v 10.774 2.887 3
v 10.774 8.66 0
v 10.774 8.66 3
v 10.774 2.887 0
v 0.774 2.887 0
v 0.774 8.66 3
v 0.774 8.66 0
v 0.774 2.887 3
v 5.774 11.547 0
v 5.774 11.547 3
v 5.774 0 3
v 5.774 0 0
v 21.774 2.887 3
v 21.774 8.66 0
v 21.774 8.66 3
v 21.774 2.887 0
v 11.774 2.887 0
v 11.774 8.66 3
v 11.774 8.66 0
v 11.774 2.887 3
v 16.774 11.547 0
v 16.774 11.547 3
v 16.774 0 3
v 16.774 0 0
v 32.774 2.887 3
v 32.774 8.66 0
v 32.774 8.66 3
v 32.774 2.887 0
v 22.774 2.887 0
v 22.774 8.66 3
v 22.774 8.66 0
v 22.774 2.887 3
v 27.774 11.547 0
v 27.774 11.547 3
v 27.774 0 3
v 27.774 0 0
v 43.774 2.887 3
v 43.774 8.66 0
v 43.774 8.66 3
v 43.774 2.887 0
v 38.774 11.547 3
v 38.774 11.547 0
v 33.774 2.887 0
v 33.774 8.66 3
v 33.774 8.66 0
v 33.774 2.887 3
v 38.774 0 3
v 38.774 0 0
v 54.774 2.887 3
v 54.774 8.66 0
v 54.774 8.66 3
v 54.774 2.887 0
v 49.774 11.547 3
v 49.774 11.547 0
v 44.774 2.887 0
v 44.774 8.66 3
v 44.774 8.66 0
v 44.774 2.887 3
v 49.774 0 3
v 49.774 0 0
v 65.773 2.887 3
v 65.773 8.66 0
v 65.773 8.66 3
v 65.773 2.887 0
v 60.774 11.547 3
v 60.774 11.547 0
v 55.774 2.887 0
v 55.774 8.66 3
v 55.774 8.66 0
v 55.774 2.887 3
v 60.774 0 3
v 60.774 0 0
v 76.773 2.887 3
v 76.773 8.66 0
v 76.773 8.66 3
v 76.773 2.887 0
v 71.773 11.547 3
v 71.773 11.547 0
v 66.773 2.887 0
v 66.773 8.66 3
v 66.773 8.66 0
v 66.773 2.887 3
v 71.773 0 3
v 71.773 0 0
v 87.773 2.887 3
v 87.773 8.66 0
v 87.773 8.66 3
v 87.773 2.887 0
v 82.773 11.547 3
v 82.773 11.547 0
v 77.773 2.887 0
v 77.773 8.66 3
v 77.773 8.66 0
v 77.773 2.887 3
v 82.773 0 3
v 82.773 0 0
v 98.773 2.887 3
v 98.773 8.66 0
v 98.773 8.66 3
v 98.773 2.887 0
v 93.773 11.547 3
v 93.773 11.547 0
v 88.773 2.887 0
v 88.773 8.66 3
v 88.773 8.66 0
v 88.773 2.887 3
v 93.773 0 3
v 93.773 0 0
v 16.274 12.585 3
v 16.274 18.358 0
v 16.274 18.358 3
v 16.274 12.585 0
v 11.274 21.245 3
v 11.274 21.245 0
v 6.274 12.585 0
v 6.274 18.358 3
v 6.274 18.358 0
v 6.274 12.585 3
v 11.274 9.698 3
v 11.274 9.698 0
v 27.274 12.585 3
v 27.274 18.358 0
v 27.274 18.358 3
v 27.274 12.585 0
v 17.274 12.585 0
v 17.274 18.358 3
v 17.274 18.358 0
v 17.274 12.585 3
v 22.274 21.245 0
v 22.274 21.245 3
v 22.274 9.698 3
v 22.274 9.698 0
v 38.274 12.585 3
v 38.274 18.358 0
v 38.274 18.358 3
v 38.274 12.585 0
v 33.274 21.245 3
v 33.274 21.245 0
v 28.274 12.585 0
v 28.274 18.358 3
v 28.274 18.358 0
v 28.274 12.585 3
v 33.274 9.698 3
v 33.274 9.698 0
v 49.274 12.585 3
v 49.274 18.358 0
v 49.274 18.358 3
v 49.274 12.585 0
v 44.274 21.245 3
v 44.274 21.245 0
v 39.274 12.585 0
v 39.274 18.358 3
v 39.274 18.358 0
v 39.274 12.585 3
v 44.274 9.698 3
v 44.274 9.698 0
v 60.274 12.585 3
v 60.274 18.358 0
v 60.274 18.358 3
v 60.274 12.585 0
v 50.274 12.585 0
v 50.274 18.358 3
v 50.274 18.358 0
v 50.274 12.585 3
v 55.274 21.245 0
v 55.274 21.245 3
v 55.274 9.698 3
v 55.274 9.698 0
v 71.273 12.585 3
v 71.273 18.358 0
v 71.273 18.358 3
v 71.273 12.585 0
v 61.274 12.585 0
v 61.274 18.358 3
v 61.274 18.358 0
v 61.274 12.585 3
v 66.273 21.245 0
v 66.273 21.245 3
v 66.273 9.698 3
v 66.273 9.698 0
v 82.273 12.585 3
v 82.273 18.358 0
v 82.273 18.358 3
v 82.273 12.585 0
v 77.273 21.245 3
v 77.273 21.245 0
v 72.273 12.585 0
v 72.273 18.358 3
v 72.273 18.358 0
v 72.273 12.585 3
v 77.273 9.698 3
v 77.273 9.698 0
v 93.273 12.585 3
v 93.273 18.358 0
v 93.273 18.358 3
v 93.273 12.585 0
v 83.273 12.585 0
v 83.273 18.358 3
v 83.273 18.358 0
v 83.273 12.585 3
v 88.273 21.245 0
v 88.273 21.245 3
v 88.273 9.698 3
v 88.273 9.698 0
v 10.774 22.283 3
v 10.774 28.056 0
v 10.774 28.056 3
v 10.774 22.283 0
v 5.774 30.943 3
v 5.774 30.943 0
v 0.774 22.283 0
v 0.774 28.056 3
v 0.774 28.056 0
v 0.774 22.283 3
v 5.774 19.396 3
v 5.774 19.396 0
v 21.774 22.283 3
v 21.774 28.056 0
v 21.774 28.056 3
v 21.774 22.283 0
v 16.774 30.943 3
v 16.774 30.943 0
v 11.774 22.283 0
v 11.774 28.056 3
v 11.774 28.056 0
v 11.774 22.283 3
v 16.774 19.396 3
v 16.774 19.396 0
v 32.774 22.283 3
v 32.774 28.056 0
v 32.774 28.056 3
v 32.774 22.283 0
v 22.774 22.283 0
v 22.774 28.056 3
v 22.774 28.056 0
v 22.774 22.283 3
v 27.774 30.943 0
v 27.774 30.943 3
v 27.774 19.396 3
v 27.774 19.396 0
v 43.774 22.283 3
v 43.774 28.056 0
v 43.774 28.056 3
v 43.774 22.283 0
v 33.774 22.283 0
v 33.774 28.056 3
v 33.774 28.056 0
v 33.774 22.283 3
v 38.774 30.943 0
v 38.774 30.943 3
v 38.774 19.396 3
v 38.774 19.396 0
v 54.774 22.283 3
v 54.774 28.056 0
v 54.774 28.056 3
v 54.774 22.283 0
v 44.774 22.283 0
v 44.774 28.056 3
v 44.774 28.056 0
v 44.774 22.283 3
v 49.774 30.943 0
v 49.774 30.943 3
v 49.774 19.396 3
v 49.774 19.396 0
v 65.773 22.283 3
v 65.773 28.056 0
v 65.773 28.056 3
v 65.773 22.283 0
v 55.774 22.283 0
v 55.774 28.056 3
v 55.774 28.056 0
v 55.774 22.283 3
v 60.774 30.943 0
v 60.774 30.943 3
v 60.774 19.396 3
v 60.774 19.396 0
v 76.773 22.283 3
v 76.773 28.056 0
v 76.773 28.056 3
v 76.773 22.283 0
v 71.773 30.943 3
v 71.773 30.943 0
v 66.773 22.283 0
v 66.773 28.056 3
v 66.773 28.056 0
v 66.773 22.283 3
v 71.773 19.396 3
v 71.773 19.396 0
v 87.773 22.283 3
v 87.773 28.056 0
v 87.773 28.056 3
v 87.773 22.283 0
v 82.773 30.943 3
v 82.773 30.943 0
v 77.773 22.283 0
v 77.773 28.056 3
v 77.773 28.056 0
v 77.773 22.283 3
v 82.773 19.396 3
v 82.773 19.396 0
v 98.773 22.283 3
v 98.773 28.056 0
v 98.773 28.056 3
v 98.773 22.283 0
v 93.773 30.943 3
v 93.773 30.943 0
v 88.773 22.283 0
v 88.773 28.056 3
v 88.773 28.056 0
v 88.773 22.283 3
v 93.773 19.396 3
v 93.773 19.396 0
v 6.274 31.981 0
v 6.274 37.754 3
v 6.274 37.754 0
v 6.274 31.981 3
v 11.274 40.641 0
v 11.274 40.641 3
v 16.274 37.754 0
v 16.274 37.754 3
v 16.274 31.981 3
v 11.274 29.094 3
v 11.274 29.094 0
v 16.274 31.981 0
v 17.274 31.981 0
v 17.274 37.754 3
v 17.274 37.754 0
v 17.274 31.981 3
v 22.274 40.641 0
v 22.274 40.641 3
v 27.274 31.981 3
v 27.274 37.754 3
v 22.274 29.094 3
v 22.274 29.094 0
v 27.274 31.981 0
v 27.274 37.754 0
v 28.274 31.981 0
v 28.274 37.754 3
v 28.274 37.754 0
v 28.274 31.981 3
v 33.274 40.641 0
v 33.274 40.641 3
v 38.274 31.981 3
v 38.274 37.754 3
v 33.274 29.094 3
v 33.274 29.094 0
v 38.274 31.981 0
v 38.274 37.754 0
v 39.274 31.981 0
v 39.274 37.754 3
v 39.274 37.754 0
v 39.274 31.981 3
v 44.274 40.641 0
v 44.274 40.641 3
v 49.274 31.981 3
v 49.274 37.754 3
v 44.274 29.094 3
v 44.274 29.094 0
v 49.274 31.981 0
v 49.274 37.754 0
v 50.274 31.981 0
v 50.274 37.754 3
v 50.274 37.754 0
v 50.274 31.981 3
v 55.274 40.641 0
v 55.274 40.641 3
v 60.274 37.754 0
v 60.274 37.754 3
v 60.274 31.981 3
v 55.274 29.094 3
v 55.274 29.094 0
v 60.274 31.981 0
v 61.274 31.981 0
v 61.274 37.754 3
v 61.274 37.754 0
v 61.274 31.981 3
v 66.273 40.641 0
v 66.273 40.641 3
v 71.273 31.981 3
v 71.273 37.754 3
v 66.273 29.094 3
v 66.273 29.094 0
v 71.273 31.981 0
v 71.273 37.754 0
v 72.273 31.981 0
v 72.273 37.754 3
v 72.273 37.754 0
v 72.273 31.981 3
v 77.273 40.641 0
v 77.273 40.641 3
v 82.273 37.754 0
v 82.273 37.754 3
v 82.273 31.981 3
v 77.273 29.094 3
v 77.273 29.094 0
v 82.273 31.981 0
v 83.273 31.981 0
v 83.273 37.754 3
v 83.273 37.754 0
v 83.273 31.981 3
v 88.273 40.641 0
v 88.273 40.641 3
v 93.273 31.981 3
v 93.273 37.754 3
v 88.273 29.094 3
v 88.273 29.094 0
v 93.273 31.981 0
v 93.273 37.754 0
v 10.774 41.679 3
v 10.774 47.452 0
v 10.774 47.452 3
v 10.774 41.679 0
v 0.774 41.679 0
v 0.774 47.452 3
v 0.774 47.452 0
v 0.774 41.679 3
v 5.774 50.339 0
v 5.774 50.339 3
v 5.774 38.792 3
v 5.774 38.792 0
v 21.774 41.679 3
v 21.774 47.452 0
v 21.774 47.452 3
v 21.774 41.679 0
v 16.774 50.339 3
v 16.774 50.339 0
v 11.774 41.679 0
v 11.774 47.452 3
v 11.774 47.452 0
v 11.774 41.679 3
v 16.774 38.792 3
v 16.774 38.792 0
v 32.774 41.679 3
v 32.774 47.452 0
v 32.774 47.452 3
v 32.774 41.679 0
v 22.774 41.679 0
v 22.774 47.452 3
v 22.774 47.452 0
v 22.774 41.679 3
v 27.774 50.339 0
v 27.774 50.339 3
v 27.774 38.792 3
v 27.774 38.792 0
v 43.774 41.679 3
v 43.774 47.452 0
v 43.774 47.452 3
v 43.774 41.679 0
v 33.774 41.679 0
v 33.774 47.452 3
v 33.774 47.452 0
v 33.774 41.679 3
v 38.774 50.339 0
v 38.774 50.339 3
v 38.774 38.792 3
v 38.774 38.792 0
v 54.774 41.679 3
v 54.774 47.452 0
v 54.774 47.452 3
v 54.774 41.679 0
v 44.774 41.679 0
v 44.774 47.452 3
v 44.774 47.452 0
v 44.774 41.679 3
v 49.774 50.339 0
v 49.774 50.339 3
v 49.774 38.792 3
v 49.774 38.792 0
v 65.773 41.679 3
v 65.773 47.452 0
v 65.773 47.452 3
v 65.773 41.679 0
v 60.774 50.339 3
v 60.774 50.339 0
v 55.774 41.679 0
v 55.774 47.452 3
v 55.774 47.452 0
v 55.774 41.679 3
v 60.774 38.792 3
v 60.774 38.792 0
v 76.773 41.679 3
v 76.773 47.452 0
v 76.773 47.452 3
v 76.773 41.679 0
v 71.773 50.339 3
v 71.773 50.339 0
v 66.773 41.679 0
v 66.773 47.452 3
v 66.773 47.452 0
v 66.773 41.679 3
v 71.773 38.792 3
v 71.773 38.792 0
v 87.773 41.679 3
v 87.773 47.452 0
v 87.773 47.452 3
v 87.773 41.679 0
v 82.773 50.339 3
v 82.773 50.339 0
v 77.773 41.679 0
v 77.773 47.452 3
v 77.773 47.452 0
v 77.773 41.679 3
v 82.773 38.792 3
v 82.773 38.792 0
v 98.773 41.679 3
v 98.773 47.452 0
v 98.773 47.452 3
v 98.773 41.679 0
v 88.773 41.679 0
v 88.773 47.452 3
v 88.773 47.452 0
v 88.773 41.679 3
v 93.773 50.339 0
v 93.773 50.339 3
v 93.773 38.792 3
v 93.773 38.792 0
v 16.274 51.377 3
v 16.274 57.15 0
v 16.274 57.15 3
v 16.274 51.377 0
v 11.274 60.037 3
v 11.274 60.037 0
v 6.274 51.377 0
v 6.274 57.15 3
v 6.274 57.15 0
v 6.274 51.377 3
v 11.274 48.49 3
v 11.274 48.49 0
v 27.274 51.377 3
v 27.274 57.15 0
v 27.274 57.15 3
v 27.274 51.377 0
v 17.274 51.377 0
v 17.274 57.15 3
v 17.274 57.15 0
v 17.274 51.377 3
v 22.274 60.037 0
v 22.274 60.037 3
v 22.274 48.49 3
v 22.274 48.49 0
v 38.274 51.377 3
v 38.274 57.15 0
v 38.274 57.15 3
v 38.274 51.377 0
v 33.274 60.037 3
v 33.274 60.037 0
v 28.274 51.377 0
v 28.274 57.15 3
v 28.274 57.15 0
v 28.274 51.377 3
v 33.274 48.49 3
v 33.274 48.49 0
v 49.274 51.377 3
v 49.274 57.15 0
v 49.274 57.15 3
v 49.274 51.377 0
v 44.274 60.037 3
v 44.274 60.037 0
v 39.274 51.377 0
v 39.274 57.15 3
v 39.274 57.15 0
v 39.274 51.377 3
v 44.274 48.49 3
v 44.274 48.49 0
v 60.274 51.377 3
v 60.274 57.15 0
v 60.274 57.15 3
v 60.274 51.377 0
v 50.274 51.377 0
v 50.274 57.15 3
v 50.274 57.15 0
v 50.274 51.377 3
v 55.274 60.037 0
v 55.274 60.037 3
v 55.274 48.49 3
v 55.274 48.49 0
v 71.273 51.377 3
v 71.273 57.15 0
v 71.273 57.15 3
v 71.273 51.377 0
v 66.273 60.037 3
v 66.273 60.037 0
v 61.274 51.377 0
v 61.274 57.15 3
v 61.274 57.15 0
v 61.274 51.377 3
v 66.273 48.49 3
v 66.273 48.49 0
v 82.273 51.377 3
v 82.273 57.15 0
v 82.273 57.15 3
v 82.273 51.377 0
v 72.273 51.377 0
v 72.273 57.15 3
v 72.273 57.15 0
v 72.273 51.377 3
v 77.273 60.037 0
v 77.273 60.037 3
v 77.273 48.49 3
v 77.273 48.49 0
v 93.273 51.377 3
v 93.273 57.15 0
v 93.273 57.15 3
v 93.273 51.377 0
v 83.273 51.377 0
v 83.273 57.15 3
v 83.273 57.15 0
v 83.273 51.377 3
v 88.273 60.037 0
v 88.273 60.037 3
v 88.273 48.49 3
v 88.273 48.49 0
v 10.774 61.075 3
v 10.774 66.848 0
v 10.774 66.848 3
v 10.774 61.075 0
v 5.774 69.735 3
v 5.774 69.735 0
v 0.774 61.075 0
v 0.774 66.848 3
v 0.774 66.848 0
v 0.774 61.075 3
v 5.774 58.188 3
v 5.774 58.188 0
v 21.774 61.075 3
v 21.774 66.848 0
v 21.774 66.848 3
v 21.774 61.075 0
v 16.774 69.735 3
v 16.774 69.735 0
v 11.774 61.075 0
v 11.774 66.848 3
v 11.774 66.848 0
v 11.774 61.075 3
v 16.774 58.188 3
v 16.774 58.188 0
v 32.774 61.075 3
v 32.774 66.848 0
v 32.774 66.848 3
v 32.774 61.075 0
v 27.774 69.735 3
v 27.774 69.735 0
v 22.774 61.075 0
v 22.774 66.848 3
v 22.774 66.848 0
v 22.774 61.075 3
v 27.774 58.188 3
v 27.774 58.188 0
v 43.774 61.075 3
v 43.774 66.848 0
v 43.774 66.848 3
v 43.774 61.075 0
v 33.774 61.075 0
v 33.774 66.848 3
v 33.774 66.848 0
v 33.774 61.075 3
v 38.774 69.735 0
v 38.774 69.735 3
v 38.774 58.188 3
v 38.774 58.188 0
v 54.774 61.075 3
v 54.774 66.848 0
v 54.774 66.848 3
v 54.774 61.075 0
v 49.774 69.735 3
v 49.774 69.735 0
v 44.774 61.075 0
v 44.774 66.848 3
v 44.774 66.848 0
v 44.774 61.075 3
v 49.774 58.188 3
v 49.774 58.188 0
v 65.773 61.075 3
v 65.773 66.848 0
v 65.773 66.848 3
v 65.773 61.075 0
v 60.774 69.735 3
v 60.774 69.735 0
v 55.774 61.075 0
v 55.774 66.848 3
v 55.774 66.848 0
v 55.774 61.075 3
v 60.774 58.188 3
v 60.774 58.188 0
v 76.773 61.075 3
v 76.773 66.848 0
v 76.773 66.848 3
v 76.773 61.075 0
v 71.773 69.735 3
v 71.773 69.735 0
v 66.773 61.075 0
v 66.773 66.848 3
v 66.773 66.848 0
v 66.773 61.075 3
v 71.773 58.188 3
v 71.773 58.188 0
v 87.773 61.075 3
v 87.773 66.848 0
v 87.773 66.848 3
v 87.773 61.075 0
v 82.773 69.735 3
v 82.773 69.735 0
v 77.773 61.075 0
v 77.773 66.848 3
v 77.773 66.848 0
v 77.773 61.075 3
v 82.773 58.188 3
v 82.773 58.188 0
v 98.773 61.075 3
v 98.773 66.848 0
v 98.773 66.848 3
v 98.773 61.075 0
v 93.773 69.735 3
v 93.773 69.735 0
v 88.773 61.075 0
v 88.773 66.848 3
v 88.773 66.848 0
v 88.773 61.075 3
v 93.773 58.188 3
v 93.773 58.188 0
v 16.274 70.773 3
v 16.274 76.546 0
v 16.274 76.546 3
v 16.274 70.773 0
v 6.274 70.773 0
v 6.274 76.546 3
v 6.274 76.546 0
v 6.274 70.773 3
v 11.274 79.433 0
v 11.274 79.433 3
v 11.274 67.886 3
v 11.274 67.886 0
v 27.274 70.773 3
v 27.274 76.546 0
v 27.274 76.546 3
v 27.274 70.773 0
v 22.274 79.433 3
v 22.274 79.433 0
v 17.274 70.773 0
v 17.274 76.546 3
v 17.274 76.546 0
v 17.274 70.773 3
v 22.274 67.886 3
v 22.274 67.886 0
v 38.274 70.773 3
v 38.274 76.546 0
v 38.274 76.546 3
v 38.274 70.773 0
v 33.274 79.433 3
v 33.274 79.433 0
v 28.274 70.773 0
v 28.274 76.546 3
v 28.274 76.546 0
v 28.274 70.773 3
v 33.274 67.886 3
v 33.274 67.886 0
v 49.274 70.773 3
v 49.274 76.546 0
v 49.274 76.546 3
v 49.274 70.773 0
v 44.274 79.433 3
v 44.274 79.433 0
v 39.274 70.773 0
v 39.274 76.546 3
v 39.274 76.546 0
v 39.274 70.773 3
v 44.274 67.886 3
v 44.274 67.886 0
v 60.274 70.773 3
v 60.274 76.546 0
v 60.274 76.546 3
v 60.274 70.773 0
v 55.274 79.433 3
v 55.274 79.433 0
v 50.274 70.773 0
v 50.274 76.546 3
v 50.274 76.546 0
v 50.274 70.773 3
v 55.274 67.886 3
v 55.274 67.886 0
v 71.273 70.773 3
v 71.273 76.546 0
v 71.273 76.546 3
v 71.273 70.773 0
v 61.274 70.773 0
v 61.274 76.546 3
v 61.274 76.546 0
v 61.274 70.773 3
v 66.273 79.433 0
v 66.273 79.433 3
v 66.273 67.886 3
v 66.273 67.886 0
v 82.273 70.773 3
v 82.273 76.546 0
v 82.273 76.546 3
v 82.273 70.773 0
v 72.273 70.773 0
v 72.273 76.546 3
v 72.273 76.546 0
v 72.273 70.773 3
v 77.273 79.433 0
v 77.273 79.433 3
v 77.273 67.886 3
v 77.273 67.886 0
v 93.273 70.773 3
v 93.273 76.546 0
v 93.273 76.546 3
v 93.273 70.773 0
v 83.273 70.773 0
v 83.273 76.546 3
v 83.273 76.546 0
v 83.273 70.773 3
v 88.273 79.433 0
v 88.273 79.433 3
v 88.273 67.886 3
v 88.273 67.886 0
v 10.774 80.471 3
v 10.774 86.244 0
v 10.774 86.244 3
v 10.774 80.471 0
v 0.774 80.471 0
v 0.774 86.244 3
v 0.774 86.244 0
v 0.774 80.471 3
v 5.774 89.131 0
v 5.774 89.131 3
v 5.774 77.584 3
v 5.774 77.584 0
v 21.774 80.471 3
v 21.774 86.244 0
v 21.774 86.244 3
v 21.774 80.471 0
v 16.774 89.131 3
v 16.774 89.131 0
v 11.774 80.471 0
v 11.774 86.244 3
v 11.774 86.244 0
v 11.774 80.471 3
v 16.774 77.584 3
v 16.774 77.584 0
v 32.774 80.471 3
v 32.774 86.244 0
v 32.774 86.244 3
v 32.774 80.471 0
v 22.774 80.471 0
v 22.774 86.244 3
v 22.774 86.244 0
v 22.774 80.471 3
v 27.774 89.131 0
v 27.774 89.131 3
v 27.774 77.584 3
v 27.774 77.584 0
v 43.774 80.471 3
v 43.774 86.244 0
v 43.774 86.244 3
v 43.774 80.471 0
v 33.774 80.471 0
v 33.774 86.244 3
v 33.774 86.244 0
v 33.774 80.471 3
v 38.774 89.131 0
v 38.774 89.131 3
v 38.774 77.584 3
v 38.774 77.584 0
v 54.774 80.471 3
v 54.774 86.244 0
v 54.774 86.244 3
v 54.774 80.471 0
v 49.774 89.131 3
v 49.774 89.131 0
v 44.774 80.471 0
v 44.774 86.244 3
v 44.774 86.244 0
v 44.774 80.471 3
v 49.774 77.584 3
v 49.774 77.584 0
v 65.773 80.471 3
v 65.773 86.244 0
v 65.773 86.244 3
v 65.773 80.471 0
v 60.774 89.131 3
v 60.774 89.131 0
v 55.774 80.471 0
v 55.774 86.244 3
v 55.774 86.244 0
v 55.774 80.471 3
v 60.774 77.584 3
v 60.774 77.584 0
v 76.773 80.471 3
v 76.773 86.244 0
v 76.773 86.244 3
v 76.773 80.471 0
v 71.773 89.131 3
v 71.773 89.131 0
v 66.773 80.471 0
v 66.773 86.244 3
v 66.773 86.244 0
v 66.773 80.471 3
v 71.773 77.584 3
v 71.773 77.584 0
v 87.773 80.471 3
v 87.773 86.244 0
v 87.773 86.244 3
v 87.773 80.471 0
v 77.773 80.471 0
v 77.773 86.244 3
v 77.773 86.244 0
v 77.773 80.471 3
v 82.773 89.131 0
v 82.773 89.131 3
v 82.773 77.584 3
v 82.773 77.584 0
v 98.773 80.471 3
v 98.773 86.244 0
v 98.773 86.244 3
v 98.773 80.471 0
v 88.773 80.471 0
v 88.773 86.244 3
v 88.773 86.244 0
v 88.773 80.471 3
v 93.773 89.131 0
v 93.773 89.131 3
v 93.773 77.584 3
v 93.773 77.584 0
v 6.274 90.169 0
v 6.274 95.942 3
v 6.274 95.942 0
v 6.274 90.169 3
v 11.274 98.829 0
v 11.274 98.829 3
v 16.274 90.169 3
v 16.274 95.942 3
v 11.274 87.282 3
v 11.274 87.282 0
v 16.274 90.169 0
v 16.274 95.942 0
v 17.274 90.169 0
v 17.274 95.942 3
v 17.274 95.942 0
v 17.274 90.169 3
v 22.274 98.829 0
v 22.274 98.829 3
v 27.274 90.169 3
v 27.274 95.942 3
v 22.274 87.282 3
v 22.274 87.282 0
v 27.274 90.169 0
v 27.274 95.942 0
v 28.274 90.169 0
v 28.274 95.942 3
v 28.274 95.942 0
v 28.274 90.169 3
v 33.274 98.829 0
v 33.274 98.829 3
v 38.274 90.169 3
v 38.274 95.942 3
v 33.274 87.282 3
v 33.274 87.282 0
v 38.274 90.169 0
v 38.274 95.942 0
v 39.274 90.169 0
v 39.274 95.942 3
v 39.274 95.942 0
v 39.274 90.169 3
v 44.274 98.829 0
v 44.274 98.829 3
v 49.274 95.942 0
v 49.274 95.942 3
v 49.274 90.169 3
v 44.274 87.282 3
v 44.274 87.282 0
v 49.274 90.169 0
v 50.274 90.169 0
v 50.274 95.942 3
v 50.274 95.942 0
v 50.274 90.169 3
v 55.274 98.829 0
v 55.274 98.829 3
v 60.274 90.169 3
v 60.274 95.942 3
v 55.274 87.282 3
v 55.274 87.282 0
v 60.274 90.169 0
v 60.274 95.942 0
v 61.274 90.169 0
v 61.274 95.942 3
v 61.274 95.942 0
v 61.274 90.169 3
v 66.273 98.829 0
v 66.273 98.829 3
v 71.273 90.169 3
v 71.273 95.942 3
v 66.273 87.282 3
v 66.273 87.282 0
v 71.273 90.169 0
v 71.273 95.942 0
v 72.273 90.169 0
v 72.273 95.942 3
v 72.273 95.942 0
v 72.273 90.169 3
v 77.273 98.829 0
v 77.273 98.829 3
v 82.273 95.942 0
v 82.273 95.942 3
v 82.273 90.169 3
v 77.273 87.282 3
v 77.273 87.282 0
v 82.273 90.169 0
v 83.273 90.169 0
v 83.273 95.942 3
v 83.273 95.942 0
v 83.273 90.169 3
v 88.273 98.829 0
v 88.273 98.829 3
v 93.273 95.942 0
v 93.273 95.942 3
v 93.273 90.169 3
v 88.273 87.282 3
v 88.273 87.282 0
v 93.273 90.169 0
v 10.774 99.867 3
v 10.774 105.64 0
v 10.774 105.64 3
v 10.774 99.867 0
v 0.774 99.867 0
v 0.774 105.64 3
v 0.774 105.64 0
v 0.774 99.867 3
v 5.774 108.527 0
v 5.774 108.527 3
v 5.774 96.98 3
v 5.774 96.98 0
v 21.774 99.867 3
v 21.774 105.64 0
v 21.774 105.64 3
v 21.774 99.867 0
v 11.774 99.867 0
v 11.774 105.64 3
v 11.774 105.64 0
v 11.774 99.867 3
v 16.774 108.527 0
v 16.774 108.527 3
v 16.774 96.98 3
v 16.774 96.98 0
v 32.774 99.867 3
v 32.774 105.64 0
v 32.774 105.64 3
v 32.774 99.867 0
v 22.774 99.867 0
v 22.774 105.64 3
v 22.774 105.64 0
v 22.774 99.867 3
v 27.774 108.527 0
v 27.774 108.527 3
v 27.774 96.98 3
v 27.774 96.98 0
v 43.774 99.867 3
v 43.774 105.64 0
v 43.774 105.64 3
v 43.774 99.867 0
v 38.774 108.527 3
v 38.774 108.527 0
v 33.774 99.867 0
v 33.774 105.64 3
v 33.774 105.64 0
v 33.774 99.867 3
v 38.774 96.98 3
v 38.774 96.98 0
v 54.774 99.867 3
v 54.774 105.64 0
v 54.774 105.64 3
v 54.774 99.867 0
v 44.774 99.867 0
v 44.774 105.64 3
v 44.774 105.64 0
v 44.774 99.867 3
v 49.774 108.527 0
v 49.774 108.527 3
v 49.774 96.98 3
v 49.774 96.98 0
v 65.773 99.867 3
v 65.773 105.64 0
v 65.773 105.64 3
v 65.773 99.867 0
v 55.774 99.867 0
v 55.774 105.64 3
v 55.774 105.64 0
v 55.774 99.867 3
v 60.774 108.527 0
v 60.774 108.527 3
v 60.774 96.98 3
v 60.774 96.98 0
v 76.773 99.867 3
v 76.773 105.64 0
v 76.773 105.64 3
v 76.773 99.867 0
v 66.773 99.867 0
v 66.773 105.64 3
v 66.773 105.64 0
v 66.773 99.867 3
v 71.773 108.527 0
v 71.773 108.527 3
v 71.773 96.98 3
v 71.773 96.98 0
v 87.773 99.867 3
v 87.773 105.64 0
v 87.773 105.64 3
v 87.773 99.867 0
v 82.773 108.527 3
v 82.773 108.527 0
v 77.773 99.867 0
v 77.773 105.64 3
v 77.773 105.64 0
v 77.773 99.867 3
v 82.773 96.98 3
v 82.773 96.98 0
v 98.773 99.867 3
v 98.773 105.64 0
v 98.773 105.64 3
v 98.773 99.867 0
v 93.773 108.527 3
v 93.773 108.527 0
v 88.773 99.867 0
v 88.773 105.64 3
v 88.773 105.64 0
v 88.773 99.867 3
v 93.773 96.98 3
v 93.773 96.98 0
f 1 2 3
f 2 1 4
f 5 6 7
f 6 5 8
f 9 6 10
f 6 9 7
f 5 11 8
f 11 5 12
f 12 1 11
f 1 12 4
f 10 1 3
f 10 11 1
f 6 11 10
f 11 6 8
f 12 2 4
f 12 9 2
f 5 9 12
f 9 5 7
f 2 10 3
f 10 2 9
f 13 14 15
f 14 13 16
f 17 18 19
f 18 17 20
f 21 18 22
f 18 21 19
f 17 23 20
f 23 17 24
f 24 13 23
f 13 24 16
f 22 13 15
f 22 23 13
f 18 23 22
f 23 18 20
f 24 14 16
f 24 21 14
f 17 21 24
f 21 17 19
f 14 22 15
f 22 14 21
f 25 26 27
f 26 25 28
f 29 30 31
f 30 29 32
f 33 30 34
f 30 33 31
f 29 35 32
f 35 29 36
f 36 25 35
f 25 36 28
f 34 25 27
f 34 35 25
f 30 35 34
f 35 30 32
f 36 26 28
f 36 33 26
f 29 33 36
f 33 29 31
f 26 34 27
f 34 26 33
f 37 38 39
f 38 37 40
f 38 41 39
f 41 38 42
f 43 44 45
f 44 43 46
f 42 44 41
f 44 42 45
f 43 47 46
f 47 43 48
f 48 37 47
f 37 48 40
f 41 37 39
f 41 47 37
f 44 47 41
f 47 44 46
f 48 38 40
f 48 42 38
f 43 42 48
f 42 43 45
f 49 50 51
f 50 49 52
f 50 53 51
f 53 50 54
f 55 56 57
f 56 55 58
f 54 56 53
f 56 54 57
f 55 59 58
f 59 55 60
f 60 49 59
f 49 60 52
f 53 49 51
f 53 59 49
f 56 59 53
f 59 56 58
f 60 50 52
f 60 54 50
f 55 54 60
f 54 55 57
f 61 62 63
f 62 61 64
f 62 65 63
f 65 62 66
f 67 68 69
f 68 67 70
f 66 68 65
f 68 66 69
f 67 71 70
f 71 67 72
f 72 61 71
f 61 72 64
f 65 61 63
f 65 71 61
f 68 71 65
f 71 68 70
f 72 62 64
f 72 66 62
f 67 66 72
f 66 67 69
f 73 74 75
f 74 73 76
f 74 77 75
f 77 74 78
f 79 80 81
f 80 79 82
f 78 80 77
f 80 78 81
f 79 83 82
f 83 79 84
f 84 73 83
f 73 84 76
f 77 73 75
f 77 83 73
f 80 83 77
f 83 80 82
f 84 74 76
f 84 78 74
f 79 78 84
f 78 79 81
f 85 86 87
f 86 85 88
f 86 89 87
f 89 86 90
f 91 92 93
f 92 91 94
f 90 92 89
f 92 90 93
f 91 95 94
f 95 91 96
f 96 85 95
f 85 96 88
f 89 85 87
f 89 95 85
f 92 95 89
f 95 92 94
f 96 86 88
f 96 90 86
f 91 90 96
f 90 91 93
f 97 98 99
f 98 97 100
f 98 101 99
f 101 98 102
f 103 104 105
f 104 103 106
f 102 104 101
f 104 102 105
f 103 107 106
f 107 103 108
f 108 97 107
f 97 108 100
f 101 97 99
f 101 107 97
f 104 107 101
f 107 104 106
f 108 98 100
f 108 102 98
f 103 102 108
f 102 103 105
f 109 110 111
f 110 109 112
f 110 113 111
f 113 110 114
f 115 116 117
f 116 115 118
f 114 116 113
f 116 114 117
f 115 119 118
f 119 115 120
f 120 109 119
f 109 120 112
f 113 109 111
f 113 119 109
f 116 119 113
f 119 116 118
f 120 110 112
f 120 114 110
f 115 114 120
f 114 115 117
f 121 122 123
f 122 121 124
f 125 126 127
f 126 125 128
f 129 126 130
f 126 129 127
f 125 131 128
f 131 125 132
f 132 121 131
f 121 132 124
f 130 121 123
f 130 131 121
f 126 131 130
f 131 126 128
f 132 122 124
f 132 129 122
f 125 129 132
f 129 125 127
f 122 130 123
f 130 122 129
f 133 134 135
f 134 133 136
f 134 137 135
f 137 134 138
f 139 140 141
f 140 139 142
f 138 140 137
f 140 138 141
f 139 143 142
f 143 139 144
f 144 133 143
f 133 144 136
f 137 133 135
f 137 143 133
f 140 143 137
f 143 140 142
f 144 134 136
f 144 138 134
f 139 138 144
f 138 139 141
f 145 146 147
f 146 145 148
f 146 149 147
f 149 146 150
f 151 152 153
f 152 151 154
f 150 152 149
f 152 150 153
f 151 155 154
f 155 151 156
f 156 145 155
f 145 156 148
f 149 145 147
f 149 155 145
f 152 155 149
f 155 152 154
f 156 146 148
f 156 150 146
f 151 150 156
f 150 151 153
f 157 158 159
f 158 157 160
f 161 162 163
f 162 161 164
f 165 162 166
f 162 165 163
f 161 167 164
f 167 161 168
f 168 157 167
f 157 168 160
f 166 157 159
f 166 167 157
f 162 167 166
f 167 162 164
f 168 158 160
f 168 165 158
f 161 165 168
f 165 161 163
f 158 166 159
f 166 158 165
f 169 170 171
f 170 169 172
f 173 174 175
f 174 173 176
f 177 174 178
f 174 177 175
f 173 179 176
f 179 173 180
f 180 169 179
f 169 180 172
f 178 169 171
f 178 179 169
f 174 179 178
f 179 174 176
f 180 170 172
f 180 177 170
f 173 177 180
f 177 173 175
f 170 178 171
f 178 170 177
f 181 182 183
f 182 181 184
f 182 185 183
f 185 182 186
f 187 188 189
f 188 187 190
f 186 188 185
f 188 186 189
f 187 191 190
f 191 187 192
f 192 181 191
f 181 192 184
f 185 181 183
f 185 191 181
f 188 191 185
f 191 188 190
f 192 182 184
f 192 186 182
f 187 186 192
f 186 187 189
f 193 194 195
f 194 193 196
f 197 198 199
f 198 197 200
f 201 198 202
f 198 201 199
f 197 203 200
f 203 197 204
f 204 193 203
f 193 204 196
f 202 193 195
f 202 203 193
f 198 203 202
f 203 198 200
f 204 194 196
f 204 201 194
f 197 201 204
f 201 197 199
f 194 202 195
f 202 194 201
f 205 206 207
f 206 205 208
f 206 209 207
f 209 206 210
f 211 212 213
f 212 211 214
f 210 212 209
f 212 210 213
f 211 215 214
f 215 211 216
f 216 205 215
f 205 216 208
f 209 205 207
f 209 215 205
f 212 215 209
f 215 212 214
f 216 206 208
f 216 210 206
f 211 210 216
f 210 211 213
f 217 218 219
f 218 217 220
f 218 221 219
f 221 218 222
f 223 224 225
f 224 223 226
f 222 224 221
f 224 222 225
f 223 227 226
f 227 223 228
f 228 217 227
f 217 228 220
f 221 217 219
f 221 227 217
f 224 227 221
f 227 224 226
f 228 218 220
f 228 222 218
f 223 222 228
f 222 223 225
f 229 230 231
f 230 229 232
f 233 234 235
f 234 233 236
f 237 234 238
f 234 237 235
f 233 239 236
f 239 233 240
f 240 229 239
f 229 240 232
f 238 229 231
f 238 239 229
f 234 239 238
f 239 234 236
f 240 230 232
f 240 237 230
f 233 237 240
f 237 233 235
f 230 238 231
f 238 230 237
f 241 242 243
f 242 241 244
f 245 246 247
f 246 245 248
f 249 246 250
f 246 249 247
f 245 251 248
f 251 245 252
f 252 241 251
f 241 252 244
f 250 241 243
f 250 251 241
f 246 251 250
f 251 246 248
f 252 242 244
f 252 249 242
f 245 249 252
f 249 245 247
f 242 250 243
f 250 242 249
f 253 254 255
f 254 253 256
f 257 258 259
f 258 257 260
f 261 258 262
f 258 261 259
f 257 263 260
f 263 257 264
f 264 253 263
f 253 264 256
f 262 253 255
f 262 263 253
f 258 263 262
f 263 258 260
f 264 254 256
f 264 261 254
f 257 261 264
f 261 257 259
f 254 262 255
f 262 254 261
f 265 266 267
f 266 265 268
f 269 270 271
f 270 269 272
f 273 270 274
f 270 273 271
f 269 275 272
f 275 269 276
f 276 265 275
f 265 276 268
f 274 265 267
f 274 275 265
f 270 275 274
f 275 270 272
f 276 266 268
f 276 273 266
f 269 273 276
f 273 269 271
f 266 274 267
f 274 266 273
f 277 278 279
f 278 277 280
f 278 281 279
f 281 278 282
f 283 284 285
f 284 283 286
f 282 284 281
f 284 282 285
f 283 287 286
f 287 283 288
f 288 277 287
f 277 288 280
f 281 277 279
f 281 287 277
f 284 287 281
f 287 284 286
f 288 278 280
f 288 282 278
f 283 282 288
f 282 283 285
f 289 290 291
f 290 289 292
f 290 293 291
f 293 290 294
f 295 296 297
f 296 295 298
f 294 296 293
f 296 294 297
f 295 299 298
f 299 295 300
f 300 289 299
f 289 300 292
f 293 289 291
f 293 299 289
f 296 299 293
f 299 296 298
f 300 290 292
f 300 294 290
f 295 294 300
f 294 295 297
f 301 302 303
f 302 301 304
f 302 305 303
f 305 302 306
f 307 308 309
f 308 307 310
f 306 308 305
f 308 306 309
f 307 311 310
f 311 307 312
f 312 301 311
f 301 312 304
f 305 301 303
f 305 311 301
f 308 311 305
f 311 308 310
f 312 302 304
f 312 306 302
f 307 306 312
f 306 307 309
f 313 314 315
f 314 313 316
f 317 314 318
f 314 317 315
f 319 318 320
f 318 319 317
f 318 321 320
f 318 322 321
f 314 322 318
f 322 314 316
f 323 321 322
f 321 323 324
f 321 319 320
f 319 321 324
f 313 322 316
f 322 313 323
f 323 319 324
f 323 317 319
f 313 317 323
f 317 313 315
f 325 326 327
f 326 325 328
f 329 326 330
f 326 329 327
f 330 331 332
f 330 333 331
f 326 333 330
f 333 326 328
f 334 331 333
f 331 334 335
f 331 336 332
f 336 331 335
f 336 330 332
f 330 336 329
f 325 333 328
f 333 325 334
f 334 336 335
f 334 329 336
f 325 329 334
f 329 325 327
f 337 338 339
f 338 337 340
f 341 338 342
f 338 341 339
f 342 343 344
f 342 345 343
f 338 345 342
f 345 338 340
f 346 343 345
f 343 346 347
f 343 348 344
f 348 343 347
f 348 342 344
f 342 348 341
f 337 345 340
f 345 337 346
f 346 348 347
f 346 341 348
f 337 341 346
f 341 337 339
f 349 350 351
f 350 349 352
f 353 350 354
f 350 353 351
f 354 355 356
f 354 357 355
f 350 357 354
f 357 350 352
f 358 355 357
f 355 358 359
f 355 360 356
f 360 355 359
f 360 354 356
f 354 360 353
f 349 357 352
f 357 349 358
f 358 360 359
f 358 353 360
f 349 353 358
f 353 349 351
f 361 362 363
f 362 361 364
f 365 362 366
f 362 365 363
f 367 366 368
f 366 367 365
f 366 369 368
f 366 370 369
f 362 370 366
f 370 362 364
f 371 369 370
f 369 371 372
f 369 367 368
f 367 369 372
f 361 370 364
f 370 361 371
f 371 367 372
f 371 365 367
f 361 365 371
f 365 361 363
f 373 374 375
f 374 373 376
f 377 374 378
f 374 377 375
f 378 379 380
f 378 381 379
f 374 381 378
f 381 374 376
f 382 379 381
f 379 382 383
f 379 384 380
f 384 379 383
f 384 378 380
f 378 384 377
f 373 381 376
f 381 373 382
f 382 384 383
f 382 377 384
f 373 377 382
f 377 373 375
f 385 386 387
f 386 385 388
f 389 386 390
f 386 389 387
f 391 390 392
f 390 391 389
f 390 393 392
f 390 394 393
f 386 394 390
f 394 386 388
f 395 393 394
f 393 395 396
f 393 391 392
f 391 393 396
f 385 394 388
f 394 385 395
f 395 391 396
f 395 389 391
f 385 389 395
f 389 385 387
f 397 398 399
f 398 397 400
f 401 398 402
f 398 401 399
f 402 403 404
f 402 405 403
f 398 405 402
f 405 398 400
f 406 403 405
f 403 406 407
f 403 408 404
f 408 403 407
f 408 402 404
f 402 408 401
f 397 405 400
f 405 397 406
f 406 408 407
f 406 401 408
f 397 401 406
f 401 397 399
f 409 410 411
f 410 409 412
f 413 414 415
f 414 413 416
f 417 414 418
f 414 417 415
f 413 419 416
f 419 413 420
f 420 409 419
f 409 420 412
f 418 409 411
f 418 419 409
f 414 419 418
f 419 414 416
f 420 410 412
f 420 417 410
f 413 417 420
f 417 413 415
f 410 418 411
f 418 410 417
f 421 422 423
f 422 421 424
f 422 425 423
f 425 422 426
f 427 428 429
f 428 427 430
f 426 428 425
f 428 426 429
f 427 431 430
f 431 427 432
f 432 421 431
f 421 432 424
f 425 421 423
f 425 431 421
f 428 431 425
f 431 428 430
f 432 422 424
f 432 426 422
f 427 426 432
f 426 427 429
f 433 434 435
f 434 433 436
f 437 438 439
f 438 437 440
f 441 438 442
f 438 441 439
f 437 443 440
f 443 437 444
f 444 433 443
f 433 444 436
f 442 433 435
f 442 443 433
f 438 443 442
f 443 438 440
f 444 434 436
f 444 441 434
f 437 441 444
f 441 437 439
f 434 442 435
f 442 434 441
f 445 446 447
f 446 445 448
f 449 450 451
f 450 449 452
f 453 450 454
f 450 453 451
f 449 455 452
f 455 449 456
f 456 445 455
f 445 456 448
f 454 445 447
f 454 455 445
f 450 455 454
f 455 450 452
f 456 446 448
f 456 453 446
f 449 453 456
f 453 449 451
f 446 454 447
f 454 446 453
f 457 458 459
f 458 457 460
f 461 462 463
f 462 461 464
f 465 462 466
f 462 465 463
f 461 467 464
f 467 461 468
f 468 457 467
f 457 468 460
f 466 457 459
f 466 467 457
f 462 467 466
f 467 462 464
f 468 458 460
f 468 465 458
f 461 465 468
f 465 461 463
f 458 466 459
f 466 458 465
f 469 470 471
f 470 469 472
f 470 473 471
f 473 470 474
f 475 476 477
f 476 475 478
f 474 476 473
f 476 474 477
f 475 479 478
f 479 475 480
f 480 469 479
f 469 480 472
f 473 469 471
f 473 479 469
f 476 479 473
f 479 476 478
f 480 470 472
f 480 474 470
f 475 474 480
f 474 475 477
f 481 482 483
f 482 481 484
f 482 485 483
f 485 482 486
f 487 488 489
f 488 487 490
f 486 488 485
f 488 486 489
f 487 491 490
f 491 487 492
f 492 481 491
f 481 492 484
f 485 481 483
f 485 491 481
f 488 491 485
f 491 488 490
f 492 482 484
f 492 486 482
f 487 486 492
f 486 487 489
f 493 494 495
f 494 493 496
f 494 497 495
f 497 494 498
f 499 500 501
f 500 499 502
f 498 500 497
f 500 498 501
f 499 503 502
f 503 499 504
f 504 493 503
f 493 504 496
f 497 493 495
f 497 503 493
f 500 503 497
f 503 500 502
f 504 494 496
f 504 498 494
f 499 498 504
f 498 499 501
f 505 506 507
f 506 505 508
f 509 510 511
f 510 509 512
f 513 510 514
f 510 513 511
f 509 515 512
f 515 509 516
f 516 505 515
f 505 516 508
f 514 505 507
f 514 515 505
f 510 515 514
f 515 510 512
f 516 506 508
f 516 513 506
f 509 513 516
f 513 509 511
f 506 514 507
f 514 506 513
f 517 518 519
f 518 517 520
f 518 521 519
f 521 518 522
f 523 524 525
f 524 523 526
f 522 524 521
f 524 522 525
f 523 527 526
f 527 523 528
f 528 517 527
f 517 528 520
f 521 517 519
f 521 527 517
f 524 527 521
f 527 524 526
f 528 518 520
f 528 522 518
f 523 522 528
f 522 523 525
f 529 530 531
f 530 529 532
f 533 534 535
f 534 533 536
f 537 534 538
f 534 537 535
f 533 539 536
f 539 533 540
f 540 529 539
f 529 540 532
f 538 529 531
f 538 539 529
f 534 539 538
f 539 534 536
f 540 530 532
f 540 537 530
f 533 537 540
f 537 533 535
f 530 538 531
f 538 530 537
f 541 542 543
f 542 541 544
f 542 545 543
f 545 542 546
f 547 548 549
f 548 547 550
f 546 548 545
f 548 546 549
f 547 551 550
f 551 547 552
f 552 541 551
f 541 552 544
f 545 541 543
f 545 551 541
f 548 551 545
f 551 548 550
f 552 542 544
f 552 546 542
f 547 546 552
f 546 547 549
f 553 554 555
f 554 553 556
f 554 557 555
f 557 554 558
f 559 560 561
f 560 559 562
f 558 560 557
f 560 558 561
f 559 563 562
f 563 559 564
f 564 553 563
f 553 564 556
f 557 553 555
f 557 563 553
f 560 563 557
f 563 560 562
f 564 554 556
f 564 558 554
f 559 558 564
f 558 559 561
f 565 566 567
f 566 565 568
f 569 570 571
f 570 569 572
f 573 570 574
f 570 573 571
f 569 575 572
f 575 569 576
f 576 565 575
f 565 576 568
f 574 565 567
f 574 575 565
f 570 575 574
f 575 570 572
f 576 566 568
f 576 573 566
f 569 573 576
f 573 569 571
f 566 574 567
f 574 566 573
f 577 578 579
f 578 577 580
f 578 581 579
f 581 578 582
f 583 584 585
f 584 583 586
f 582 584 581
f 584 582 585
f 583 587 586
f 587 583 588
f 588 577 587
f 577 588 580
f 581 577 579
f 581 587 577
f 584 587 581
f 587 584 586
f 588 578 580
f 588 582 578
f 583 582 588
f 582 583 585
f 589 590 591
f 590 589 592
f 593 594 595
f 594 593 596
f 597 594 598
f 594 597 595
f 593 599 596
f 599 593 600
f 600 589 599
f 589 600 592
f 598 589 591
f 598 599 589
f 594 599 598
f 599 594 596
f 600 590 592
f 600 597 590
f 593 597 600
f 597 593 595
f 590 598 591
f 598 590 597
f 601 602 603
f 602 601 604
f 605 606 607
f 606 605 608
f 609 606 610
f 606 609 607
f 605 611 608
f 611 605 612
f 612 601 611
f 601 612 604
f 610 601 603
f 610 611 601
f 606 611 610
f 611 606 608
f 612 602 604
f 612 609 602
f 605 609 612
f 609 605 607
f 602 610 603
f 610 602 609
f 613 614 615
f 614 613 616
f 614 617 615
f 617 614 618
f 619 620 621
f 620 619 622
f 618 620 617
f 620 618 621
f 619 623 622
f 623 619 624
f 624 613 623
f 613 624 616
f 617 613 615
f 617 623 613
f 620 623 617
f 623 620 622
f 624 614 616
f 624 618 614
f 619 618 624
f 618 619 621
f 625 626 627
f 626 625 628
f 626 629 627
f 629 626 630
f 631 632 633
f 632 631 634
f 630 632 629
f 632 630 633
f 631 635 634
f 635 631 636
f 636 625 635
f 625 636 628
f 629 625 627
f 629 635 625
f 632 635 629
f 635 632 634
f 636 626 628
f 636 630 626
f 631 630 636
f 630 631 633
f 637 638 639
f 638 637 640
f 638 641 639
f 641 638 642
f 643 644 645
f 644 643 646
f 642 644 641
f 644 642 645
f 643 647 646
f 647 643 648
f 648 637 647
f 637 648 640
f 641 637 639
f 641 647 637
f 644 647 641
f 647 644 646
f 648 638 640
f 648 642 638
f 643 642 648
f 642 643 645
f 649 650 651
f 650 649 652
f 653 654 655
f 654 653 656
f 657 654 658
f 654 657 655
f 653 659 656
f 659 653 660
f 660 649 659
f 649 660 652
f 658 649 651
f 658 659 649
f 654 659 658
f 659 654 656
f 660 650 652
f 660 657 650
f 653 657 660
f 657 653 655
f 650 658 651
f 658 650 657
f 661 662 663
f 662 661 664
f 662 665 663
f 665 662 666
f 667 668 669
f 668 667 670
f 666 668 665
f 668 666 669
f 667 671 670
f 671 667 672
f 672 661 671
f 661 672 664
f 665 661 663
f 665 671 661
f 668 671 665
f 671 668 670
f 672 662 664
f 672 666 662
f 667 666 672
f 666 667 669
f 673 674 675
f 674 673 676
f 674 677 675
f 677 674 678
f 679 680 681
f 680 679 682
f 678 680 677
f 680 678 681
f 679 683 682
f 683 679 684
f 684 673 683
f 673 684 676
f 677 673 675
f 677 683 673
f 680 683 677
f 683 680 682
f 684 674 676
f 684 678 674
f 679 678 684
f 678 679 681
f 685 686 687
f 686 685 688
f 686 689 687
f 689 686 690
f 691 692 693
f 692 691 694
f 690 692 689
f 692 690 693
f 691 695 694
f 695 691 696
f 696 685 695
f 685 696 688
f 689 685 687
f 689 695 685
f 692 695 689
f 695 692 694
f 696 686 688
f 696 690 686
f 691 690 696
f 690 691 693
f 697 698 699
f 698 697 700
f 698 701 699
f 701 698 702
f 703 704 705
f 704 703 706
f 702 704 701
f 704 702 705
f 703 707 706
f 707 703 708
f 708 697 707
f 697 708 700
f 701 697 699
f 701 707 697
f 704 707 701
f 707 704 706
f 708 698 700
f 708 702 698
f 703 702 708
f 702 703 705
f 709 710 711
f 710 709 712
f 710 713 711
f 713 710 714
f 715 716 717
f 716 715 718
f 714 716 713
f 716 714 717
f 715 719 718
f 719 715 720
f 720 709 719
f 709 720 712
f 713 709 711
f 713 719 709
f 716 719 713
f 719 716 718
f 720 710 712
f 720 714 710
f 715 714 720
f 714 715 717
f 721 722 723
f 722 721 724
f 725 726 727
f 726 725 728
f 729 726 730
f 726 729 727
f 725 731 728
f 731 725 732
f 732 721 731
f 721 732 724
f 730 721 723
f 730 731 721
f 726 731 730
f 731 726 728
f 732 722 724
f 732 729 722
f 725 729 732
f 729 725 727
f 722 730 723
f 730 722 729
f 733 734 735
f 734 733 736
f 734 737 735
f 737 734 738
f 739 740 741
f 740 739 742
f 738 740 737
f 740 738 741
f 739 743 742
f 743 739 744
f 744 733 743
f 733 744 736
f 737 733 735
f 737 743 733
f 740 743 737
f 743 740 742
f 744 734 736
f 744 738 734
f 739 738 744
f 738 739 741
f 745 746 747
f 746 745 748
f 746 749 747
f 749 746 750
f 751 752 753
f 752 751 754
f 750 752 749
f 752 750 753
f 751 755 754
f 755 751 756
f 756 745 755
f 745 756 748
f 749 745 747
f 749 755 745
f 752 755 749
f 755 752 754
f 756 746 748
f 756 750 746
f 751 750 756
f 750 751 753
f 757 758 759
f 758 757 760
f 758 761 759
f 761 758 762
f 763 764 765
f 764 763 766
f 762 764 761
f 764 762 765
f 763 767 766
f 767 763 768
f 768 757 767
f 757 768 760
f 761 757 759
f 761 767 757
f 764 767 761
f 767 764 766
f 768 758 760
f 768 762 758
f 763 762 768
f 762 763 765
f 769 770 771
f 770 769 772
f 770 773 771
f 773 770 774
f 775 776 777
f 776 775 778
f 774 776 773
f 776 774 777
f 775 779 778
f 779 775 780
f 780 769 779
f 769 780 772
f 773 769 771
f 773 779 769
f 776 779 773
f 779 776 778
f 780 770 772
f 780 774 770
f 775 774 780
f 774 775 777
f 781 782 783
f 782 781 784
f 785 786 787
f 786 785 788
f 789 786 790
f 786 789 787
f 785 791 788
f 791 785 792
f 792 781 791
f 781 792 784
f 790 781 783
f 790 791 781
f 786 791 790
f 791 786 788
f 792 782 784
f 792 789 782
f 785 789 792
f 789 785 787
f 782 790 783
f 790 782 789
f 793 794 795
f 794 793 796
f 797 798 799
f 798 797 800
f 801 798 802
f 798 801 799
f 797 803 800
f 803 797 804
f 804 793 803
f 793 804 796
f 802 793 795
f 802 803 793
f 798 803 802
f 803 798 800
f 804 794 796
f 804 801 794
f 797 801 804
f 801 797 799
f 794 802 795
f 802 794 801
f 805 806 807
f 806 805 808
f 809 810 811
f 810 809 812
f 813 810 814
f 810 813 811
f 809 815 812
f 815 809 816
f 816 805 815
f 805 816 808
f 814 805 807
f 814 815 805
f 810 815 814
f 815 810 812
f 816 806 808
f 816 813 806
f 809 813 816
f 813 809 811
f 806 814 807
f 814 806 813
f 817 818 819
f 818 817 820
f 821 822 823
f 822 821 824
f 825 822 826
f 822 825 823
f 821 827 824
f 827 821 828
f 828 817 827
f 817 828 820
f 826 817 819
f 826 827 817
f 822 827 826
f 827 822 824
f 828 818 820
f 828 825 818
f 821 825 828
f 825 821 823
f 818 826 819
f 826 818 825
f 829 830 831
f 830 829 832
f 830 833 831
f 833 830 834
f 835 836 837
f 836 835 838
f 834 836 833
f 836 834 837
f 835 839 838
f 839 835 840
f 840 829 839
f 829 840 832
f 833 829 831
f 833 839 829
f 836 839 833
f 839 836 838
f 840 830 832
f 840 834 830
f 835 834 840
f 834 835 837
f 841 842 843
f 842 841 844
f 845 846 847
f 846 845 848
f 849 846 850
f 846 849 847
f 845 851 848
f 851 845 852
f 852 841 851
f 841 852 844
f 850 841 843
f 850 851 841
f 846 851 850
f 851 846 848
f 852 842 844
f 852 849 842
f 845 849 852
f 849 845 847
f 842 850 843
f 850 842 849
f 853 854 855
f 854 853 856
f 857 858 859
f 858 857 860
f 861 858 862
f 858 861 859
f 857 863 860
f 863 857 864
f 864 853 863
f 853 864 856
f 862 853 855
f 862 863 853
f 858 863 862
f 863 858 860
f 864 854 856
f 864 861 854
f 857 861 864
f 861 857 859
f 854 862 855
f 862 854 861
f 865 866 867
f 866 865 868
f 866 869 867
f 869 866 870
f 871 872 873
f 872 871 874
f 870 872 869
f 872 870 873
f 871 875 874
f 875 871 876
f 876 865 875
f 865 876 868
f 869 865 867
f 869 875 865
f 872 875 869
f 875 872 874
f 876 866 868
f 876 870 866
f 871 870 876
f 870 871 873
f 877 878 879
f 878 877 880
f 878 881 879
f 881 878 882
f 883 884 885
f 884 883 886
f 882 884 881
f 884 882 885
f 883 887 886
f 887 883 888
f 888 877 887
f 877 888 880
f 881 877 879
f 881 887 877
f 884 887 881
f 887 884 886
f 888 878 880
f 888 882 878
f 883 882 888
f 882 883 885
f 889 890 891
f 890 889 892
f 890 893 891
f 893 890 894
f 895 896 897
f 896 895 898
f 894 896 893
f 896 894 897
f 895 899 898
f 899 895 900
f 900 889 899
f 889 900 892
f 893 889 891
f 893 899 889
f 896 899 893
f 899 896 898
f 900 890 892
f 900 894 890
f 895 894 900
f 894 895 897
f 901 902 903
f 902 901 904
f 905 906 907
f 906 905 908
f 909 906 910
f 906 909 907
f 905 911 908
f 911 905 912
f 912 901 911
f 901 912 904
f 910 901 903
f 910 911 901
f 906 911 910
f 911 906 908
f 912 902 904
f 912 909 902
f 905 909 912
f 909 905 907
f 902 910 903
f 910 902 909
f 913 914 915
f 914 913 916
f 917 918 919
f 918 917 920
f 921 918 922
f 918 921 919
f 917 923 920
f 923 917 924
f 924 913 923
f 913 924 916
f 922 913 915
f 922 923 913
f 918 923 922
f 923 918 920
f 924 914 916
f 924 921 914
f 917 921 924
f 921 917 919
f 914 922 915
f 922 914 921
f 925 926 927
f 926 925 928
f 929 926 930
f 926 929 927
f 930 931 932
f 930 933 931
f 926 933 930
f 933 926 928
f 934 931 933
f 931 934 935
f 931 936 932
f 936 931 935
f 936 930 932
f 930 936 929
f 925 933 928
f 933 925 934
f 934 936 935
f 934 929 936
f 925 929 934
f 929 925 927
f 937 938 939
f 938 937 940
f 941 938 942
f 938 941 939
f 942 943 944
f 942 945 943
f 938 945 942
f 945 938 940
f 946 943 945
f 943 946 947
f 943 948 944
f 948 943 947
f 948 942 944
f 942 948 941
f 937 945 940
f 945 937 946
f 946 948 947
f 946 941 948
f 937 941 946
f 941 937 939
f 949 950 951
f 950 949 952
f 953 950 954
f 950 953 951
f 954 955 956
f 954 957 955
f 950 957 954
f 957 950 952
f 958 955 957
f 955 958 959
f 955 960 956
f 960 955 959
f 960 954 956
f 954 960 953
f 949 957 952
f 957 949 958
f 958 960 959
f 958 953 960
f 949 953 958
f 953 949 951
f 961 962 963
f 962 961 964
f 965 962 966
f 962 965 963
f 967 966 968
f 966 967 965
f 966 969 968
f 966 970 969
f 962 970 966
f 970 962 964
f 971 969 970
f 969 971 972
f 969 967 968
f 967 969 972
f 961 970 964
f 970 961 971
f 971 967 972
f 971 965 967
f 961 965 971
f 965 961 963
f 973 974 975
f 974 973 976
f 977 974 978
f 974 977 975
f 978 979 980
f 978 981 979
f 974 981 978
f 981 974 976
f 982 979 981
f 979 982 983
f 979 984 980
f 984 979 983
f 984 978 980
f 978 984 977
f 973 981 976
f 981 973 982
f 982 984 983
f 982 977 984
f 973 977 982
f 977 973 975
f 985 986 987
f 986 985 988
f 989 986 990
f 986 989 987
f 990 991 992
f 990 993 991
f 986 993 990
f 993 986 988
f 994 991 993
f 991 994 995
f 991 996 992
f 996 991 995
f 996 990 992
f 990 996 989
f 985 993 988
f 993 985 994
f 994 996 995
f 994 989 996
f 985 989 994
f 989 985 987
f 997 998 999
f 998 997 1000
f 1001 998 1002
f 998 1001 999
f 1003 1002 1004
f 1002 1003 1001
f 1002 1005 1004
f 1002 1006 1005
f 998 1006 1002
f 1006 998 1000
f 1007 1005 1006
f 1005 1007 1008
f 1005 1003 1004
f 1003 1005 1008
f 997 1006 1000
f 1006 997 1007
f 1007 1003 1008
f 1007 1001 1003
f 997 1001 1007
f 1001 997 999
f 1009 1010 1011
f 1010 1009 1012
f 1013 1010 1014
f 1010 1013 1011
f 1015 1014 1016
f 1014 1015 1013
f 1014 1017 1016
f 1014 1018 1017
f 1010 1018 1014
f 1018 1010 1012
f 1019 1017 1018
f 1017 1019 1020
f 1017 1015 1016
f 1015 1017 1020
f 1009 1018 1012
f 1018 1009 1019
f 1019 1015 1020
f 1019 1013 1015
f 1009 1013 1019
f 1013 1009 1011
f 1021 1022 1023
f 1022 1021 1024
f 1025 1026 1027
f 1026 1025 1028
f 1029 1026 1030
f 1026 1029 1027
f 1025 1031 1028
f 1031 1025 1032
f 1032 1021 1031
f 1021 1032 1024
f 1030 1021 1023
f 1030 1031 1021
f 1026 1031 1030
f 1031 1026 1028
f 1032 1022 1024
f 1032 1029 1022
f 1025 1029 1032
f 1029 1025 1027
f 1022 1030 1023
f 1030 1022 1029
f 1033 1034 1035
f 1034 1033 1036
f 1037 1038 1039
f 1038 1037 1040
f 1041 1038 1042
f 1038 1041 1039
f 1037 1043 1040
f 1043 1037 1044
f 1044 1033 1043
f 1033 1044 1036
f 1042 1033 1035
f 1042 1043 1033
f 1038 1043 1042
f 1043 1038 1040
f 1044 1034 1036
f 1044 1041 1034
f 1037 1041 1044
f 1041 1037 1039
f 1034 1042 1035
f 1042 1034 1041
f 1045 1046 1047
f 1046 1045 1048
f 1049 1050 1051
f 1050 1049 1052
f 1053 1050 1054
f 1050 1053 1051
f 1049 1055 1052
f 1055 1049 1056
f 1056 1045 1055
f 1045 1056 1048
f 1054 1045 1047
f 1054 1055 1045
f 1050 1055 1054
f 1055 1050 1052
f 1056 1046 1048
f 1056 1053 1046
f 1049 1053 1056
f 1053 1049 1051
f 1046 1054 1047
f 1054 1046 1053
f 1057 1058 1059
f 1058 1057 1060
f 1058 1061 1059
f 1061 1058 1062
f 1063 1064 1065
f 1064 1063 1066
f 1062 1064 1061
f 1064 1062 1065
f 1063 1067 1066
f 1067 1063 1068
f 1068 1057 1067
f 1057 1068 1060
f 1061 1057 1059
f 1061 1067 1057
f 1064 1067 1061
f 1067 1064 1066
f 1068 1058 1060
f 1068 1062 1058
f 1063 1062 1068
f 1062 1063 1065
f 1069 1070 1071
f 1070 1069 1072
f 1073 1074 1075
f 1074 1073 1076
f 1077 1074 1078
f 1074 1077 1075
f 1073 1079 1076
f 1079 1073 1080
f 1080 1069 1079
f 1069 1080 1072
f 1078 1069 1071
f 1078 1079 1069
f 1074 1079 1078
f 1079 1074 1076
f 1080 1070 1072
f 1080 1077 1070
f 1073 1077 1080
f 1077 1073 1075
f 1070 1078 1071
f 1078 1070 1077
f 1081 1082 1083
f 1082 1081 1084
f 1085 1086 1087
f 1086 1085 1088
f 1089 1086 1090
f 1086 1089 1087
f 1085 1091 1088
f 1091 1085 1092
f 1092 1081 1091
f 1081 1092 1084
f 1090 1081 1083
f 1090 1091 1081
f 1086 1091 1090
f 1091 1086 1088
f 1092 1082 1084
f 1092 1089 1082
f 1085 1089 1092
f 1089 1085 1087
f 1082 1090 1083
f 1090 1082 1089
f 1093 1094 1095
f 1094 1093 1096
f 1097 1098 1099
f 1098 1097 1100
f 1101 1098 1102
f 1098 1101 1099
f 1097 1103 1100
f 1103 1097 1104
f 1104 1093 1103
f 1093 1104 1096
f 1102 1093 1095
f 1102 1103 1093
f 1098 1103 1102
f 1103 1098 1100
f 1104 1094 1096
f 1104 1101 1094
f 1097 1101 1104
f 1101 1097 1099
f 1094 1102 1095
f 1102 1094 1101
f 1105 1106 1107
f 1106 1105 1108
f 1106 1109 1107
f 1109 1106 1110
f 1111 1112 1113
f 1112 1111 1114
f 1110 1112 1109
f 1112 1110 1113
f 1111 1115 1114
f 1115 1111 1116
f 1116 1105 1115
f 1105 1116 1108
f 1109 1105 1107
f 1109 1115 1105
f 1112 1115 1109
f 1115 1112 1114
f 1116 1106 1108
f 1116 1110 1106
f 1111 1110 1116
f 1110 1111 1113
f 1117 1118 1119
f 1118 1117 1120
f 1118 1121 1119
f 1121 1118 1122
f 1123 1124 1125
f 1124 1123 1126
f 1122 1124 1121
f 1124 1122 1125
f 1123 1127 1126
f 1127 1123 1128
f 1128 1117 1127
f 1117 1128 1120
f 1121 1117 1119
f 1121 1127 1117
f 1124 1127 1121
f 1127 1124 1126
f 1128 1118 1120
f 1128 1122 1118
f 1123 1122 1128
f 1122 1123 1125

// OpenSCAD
// created by IndiePandaaaaa | Lukas

function hexagon_get_inner_diameter(single_outer_diameter = 20) = tan(60) * (single_outer_diameter / 2);

function hexagon_inbetween_distance_x(single_outer_diameter = 20) = single_outer_diameter -
  hexagon_get_inner_diameter(single_outer_diameter);

function hexagon_get_y_inner_element_additional_height(single_outer_diameter = 20) = single_outer_diameter / 2 +
    hexagon_inbetween_distance_x(single_outer_diameter) * cos(30) + (single_outer_diameter / 2) * cos(60);

function hexagon_get_y_outer_element_height(single_outer_diameter = 20) = single_outer_diameter;

function hexagon_get_y_next_structure(single_outer_diameter = 20) = (single_outer_diameter / 2 * 3) +
    hexagon_inbetween_distance_x(single_outer_diameter) * cos(30) * 2;

function hexagon_get_y_element_height(single_outer_diameter = 20) =
  hexagon_get_y_outer_element_height(single_outer_diameter) +
  hexagon_get_y_inner_element_additional_height(single_outer_diameter);

function hexagon_get_x_element_count(width, single_outer_diameter = 20) = floor(width / single_outer_diameter);

function hexagon_get_y_element_count(depth, single_outer_diameter = 20) = floor(((depth -
  (hexagon_get_y_element_height(single_outer_diameter) - hexagon_get_y_next_structure(single_outer_diameter))) /
  hexagon_get_y_next_structure(single_outer_diameter)) * 2);

function hexagon_get_used_width(width, single_outer_diameter = 20) = single_outer_diameter *
  hexagon_get_x_element_count(width, single_outer_diameter) - hexagon_inbetween_distance_x(single_outer_diameter);

function hexagon_get_used_depth(depth, single_outer_diameter = 20) = round(hexagon_get_y_element_count(depth,
single_outer_diameter) / 2) * hexagon_get_y_outer_element_height(single_outer_diameter) +
    floor(hexagon_get_y_element_count(depth, single_outer_diameter) / 2) * (hexagon_get_y_next_structure(
  single_outer_diameter) - single_outer_diameter) +
      (hexagon_get_y_element_count(depth, single_outer_diameter) + 1) % 2 * (hexagon_get_y_element_height(
  single_outer_diameter) - hexagon_get_y_next_structure(single_outer_diameter));

module hexagon_pattern(width, depth, thickness, single_outer_diameter = 20, vertices = 6) {
  inner_diameter = hexagon_get_inner_diameter(single_outer_diameter);

  count_x = hexagon_get_x_element_count(width, single_outer_diameter);
  count_y = hexagon_get_y_element_count(depth, single_outer_diameter);

  angle = 360 / vertices * 1.5;

  for (y = [0:count_y - 1]) {
    for (x = [0:count_x - 1]) {

      if (y % 2 == 0) {
        translate([inner_diameter / 2 + single_outer_diameter * x, (single_outer_diameter / 2) + inner_diameter
          * y, -0.01]) {
          linear_extrude(height = thickness + 0.02) {
            rotate([0, 0, angle]) circle(d = single_outer_diameter, $fn = vertices);
          }
        }
      } else if (x < count_x - 1) {
        translate([inner_diameter / 2 + single_outer_diameter * x + single_outer_diameter / 2,
            (single_outer_diameter / 2) + inner_diameter * y, -0.01]) {
          linear_extrude(height = thickness + 0.02) {
            rotate([0, 0, angle]) circle(d = single_outer_diameter, $fn = vertices);
          }
        }
      }

    }
  }
}


module __hex_pattern(width, depth, thickness, hex_inner_diameter = 10, border_thickness = 1) {
  function __hex_outer_diameter(inner_diameter) = ((inner_diameter / 2) / tan(60)) * 4;
  function __hex_count_width(width, inner_diameter, border_thickness) = floor((width - border_thickness) / (inner_diameter + border_thickness));
  function __hex_count_depth(depth, inner_diameter, border_thickness) = floor((depth - border_thickness) / (inner_diameter * .75 + border_thickness));

  hex_outer_diameter = __hex_outer_diameter(hex_inner_diameter);
  count_x = __hex_count_width(width, hex_inner_diameter, border_thickness);
  count_y = __hex_count_depth(depth, hex_inner_diameter, border_thickness);

// TODO: 2D approach?
  for (y = [0:count_y - 1]) {
    for (x = [0:count_x - 1]) {
      translate([
          //(hex_id - grid_thickness * hex_id/4) * x, 
          //(hex_od - grid_thickness * hex_od/4) * y + ((hex_id/2 - grid_thickness/2)* (x%2)),
      (hex_inner_diameter + border_thickness) * x + (hex_inner_diameter / 2 + border_thickness / 2) * (y%2),
      (hex_outer_diameter/3*2 + border_thickness*2) * y,
      0
      ]) {
          if (y%2 == 1 && count_x-1 == x) {}
          else
            translate(v = [hex_outer_diameter/2, hex_outer_diameter/2, 0])
              rotate(a = 90, v = [0,0,1]) 
                cylinder(h = thickness, d=hex_outer_diameter, center = false, $fn = 6);
      }
    }
  }
}

width = 100;
depth = 100;
difference() {
  //cube([width, depth, 3]);
  //translate([(width - hexagon_get_used_width(width)) / 2, (depth - hexagon_get_used_depth(depth)) / 2, 0])
    __hex_pattern(width, depth, 3);
}

module hex_structure(inner_diameter, thickness, horizontal_count, vertical_count, height, screw_mounting_thickness = 2.5, bottom_floor = 1) {
  module hex_pattern(diameter, distance, height=2, h_count=5, v_count=4) {
    od = diameter;
    id = (cos(30) * (diameter/2))*2;
    h_offset = id + distance;
    v_offset = cos(30)*h_offset;
    for (v=[0:v_count-1]) {
      for (h=[0:h_count-1]) {
        if (!(v%2==1 && h==h_count-1))
          translate(v = [h_offset*h + (h_offset/2*(v%2)), v_offset*v, 0]) 
            rotate(a = 30, v = [0, 0, 1]) 
              cylinder(h = height, r = diameter/2, center = false, $fn=6);
      }
    }
  }

  difference() {
    outer_diameter = inner_diameter + thickness * 2;
    outer_distance = -.7 * thickness;
    horizontal_width = (cos(30) * (outer_diameter/2))*2*horizontal_count + outer_distance*(horizontal_count-1);
    vertical_depth = cos(30)*((cos(30) * (inner_diameter/2))*2 + thickness) * (vertical_count-1);
    union() {
      if (screw_mounting_thickness > 0)
        translate(v = [-(cos(30)*outer_diameter/2), 0, 0]) cube(size = [horizontal_width, vertical_depth, screw_mounting_thickness], center = false);
      hex_pattern(diameter=outer_diameter, distance=outer_distance, height=height, h_count=horizontal_count, v_count=vertical_count);
    }
    translate(v = [0, 0, bottom_floor > 0 ? bottom_floor : -.1]) 
      hex_pattern(diameter=inner_diameter, distance=thickness, height=height + .2, h_count=horizontal_count, v_count=vertical_count);
  }
}
